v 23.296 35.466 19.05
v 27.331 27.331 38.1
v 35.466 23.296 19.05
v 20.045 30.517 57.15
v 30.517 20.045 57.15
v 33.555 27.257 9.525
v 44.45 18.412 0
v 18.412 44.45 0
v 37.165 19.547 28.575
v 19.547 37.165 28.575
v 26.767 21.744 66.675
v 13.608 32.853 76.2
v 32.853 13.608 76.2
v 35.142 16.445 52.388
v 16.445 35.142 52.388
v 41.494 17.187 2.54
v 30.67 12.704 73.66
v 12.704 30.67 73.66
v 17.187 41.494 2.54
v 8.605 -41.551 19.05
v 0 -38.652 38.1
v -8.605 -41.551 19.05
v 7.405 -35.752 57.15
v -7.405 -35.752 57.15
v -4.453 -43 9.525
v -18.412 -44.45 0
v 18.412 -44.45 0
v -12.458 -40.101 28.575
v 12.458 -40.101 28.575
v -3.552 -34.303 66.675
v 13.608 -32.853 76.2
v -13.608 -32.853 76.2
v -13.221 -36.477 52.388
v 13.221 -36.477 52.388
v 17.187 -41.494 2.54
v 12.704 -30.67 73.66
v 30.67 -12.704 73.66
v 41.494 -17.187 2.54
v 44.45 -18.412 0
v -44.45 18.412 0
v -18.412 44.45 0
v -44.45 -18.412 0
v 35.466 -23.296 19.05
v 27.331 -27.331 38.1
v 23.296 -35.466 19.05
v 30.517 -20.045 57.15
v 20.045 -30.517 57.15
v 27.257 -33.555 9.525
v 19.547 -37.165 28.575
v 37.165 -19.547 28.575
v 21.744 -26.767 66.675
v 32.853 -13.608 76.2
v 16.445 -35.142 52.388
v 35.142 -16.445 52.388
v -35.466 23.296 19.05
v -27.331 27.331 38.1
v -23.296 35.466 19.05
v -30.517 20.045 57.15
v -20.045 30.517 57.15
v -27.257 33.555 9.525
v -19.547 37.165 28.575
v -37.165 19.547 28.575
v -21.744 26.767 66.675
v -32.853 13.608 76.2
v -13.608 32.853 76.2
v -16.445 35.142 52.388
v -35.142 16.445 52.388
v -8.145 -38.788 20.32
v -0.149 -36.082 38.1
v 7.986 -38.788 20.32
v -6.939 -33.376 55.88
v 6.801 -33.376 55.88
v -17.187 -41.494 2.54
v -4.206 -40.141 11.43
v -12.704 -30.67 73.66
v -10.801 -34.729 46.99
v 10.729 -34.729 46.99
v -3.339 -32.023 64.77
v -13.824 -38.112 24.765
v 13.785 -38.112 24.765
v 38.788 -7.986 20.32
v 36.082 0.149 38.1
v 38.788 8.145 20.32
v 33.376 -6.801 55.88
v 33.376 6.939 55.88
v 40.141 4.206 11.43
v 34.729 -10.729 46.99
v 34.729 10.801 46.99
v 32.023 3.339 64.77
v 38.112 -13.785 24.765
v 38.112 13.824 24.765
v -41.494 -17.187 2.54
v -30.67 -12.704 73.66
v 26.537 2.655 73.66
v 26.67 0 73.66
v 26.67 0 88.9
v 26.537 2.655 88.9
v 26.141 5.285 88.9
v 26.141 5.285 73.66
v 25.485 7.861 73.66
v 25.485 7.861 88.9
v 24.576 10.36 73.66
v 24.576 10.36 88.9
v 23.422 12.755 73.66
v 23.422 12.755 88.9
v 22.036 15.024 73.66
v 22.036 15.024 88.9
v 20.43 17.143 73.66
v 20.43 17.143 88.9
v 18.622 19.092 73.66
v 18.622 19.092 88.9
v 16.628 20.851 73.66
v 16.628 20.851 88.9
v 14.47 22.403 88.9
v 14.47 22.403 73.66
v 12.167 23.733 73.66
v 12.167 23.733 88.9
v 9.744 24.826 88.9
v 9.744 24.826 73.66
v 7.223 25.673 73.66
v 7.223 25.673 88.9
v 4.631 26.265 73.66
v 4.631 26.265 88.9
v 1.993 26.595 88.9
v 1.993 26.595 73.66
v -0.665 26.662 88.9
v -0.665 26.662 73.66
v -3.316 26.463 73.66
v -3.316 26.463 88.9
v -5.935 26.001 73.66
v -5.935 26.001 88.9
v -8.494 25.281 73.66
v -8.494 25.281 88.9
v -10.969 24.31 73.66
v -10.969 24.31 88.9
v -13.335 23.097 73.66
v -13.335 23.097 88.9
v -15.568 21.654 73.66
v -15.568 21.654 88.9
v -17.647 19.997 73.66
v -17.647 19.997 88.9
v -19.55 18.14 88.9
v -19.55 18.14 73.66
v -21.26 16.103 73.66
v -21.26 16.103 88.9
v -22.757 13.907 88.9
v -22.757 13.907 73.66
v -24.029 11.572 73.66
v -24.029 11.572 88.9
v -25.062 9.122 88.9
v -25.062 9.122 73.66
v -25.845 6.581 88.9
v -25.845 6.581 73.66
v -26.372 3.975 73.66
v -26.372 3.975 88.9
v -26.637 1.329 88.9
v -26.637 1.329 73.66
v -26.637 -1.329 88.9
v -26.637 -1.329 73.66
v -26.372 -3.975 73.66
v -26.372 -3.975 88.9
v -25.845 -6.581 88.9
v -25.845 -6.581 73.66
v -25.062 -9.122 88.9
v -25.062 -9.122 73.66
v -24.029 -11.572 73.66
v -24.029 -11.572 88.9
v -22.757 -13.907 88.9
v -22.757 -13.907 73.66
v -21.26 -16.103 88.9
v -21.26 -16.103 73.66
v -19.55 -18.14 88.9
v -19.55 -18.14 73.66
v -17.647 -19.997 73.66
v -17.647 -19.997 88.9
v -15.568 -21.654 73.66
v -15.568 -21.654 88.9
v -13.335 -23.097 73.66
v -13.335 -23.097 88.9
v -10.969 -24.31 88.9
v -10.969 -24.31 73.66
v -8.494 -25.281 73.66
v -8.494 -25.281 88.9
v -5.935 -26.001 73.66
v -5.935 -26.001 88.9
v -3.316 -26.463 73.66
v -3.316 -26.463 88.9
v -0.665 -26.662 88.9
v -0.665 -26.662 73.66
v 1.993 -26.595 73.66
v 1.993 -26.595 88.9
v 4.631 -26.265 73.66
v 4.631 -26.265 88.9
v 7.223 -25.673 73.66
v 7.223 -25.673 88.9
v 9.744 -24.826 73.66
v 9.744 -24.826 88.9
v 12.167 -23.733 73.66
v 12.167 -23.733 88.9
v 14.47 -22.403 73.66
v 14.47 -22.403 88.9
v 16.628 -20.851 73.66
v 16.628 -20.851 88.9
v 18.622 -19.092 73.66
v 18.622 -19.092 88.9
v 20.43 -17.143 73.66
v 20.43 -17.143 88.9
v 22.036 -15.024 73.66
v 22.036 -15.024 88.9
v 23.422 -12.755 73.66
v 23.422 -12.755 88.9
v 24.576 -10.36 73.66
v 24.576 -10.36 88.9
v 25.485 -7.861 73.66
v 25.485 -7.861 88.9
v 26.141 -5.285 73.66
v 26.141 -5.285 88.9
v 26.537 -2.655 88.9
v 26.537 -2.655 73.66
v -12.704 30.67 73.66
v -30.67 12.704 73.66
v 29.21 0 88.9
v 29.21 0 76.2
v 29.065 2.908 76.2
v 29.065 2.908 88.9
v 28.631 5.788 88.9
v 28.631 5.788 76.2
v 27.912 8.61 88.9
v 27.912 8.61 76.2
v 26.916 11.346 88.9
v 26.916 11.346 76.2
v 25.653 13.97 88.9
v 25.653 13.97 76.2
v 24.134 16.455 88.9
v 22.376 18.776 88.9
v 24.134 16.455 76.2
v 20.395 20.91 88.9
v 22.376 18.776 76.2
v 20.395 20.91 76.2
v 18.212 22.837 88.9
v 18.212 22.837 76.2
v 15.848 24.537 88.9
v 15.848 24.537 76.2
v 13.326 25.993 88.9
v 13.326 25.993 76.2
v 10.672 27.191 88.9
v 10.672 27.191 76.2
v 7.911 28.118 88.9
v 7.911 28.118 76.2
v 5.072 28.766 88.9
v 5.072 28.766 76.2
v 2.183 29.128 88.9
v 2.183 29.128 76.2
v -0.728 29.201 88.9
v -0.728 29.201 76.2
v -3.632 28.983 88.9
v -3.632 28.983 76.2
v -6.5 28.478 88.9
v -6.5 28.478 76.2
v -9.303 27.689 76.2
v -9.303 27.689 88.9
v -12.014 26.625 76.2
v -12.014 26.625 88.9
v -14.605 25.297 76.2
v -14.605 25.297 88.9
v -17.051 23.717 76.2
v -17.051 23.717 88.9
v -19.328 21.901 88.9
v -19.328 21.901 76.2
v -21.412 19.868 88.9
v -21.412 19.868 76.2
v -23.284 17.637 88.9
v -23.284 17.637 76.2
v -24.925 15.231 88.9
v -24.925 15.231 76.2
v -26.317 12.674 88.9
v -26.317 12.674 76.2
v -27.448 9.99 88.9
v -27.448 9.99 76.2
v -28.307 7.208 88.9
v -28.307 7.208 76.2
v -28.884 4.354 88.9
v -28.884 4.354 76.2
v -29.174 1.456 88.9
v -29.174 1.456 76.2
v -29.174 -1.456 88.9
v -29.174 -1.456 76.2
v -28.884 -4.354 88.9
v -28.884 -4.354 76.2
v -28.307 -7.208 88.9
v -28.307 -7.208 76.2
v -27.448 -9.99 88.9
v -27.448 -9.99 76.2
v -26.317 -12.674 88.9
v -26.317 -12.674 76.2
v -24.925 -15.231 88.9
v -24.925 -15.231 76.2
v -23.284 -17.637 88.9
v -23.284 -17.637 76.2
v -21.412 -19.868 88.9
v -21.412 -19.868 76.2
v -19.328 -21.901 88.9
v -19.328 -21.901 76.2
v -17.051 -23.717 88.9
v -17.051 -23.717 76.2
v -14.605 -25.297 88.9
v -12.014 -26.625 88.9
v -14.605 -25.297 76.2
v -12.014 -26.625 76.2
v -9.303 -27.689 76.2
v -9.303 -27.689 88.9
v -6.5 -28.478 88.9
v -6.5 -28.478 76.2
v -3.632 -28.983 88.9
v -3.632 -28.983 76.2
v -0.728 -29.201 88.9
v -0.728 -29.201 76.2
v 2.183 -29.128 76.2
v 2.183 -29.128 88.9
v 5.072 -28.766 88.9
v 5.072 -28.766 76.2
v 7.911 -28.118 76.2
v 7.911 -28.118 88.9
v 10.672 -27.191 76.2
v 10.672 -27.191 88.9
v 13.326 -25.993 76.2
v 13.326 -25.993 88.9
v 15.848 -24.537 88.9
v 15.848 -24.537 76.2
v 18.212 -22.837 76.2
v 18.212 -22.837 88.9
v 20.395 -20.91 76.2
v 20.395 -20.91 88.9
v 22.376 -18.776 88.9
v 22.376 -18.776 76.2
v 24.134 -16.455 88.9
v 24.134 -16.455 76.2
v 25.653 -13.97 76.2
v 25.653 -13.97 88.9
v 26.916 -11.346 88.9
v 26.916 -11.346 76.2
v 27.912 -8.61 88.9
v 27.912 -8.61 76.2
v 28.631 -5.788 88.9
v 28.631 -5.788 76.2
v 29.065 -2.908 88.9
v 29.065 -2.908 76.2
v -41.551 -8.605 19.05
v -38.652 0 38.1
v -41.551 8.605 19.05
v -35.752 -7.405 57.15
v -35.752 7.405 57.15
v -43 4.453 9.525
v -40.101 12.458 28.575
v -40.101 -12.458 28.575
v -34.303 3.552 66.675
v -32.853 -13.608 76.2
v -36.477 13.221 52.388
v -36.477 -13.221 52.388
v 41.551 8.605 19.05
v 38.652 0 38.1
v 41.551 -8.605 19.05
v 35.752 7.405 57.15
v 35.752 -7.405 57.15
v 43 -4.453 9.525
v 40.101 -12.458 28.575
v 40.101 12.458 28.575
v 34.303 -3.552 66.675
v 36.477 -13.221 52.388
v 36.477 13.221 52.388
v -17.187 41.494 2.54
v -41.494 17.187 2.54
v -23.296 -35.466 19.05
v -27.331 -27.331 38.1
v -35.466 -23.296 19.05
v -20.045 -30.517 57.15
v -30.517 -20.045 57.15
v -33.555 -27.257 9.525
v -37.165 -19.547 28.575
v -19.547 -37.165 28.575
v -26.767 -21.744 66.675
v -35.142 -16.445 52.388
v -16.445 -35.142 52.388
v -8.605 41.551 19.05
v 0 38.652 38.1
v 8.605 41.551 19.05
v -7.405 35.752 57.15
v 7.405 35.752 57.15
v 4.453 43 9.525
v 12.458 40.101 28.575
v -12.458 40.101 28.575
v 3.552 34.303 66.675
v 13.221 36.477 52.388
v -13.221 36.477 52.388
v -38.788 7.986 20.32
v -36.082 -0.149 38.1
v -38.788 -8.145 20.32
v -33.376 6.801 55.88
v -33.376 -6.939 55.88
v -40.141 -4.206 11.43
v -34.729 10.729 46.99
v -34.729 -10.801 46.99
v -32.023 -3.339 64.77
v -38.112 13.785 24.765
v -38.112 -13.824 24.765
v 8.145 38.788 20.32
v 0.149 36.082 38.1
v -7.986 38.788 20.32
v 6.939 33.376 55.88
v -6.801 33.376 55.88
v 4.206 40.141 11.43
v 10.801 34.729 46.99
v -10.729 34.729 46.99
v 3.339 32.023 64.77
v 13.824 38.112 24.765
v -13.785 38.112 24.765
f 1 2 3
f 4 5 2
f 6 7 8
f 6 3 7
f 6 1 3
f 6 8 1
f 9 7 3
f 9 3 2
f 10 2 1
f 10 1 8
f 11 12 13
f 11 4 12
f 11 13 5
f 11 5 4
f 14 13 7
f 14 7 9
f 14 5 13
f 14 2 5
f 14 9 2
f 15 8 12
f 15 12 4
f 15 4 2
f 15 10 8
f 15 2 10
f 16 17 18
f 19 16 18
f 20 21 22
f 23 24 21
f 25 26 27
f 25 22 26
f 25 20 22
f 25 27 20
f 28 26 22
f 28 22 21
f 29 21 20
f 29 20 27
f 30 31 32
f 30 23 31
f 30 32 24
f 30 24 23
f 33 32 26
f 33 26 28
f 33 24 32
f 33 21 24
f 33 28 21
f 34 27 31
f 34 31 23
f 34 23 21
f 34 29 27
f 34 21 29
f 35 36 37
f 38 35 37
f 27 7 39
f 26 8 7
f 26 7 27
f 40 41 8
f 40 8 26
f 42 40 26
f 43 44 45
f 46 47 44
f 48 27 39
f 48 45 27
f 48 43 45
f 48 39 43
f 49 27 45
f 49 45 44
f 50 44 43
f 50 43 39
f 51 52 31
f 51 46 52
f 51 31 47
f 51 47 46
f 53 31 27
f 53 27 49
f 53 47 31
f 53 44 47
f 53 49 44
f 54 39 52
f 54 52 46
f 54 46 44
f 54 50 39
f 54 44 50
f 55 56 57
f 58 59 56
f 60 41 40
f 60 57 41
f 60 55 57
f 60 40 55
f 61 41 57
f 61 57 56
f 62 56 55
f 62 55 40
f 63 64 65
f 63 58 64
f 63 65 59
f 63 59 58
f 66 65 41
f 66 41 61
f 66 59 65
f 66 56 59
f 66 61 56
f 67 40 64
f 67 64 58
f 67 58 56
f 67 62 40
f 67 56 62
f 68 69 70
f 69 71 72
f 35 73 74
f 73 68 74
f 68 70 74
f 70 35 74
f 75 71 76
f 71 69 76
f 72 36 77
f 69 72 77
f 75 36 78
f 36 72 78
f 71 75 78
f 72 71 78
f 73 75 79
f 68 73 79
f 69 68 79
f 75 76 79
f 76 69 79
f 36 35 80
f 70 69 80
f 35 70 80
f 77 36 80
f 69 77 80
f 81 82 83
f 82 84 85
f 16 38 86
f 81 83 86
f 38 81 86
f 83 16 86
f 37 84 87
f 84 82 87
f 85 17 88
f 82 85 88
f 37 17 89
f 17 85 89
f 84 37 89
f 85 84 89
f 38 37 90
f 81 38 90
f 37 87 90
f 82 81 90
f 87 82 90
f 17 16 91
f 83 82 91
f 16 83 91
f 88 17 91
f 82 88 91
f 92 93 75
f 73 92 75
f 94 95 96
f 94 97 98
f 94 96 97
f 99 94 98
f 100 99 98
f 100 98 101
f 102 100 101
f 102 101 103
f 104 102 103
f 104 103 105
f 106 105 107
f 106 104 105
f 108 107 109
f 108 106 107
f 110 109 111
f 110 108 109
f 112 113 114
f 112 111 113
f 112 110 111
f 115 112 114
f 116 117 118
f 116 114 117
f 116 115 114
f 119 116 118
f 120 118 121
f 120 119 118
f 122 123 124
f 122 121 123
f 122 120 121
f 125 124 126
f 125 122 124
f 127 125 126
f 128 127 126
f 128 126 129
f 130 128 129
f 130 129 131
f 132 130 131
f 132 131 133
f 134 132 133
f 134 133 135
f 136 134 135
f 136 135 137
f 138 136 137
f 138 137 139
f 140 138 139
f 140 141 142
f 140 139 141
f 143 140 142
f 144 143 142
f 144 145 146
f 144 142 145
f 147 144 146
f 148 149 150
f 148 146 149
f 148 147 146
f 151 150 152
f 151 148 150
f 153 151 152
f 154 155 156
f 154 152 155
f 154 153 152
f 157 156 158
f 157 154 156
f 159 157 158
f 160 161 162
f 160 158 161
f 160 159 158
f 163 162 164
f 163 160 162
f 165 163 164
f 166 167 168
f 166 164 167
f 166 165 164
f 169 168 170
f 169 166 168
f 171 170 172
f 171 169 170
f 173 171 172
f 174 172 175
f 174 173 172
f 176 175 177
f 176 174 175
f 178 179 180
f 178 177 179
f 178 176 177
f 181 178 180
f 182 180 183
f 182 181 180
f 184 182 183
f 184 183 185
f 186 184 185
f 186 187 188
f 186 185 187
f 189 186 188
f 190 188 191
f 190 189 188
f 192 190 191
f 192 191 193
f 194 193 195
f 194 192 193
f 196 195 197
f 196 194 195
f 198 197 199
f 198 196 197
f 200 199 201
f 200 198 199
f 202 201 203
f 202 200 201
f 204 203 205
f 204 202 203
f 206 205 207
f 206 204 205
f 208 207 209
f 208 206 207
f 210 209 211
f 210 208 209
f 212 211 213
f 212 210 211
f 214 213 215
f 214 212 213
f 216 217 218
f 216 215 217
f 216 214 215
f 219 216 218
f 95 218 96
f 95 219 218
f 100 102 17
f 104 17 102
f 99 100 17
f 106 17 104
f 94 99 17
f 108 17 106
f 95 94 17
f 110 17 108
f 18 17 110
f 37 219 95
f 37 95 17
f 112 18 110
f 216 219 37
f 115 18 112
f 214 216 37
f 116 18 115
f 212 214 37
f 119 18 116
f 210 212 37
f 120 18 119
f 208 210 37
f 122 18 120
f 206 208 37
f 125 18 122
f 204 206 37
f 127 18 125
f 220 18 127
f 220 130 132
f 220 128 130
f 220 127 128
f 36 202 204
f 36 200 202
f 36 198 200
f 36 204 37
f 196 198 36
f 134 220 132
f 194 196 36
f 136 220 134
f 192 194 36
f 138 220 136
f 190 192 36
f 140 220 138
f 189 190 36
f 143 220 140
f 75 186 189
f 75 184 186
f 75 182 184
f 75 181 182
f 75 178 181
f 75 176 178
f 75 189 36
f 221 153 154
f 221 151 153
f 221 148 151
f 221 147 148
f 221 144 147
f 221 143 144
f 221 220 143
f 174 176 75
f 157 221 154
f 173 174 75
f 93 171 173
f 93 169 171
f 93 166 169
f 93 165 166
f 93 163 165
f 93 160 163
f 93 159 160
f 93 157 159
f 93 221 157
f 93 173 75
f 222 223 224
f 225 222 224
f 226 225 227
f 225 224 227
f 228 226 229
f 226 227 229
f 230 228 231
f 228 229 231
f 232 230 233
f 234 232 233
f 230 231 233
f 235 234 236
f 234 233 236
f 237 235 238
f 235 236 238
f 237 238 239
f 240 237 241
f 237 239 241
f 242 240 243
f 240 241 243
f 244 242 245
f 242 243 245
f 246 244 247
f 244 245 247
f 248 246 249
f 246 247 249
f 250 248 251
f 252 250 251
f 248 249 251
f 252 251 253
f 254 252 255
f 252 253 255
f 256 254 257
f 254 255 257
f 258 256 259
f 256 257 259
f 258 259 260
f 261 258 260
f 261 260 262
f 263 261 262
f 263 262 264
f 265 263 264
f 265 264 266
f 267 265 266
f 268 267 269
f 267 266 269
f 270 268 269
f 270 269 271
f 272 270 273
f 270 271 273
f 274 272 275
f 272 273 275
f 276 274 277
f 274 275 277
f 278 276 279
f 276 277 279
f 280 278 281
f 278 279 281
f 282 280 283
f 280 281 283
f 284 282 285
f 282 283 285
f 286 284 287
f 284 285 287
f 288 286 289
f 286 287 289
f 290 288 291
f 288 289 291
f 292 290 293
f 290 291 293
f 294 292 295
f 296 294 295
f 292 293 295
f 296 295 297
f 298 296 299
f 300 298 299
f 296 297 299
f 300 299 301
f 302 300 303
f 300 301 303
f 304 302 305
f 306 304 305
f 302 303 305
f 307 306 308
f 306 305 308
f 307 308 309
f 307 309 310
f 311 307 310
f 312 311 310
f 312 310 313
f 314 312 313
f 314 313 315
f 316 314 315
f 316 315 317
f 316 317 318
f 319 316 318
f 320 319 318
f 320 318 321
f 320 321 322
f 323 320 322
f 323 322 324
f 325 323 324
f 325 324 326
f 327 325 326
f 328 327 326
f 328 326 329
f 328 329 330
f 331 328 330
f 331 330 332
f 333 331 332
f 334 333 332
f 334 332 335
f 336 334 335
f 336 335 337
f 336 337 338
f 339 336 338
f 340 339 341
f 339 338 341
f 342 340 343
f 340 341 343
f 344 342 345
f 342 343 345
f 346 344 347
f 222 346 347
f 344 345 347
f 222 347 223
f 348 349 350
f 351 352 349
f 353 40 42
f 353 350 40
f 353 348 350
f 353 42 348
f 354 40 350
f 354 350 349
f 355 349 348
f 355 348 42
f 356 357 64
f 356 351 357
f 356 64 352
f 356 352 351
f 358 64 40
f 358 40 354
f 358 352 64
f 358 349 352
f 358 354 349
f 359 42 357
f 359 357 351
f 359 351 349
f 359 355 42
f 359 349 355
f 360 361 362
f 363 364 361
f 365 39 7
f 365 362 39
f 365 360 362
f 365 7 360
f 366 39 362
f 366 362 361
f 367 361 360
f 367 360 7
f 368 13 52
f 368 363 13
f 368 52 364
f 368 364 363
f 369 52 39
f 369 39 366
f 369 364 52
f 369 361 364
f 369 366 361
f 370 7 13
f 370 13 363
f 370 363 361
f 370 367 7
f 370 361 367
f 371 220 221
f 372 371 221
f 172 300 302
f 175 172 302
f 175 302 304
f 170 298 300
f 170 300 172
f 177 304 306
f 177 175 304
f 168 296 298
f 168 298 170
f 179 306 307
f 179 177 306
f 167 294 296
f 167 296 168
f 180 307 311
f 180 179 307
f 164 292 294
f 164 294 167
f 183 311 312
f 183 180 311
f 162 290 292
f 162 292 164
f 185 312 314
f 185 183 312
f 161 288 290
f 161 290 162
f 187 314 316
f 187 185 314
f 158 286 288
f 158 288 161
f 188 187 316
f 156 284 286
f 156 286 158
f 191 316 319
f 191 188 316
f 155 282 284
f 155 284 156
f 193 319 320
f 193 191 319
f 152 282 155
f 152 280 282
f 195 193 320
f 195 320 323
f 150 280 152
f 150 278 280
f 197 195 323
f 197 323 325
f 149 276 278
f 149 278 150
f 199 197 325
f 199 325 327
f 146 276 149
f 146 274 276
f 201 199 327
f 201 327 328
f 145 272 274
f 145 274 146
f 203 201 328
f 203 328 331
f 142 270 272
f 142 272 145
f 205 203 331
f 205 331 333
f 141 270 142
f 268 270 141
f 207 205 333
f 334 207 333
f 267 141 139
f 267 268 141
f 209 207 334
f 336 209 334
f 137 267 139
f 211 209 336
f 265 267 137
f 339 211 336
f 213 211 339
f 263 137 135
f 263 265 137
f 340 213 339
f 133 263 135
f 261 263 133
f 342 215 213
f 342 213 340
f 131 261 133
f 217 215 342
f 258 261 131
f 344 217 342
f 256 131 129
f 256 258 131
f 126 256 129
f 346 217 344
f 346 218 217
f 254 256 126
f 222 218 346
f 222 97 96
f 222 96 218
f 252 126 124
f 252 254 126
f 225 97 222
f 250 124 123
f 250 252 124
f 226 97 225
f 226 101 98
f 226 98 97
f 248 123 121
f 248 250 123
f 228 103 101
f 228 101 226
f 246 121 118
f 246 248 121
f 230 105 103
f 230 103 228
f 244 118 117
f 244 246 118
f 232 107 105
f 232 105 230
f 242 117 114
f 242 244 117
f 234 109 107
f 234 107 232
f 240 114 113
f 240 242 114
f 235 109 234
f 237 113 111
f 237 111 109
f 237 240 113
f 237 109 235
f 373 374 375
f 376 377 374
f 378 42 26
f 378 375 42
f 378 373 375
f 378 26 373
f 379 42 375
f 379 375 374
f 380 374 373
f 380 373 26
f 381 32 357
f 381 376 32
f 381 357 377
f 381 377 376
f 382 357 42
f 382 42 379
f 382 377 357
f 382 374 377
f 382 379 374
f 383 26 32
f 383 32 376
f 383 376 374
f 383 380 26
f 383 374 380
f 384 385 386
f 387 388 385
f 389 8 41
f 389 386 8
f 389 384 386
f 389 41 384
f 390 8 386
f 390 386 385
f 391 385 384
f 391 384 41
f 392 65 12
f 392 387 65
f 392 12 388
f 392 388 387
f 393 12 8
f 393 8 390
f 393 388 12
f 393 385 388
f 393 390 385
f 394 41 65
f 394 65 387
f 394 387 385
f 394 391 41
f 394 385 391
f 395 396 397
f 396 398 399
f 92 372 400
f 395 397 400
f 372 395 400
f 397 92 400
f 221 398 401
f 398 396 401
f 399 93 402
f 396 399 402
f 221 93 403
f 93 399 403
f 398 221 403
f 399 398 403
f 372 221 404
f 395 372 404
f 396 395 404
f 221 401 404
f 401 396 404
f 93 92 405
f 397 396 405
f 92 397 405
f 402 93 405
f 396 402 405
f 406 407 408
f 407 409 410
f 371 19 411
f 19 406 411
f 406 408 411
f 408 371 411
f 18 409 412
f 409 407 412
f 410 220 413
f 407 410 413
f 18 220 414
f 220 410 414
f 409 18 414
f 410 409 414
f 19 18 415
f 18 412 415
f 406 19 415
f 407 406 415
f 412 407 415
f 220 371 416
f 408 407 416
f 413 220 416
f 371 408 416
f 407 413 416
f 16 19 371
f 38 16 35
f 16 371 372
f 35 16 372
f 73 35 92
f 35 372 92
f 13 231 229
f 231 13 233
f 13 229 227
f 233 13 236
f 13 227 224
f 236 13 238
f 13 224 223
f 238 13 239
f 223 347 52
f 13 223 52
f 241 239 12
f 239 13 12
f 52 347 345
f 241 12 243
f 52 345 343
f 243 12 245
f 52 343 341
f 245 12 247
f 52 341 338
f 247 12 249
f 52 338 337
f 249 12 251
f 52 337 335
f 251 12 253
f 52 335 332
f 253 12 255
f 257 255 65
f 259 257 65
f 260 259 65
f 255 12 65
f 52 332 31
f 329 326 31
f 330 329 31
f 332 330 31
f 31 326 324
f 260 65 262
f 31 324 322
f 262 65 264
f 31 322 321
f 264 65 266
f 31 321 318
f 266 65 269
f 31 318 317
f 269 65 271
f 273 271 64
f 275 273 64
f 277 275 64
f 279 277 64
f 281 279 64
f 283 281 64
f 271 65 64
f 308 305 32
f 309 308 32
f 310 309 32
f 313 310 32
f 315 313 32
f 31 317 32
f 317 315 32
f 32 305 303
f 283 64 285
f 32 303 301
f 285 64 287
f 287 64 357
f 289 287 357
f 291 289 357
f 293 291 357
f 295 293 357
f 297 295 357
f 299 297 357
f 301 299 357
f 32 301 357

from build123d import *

# Parameters (mm, degrees)
F4_R     = 29.21
F5_DEPTH = 12.7
F6_T     = -2.54


with BuildPart() as f3:
    # F0 (on Top) → F3 section 0
    with BuildSketch(Plane.XY):
        Polygon((18.4117928475, 44.45), (-18.4117928475, 44.45), (-44.45, 18.4117928475), (-44.45, -18.4117928475), (-18.4117928475, -44.45), (18.4117928475, -44.45), (44.45, -18.4117928475), (44.45, 18.4117928475), align=None)
    # F2 (on offset) → F3 section 1
    with BuildSketch(Plane.XY.offset(76.2)):
        Polygon((32.8531561761, -13.6082228549), (32.8531561761, 13.6082228549), (13.6082228549, 32.8531561761), (-13.6082228549, 32.8531561761), (-32.8531561761, 13.6082228549), (-32.8531561761, -13.6082228549), (-13.6082228549, -32.8531561761), (13.6082228549, -32.8531561761), align=None)
    loft()

    # F4 (on face) → F5 (join)
    with BuildSketch(Plane.XY.offset(76.2)):
        Circle(F4_R)
    extrude(amount=F5_DEPTH)

    # F6
    f6_openings = [f3.faces().sort_by_distance(p)[0] for p in [
        (0, 0, 88.9),
    ]]
    offset(amount=F6_T, openings=f6_openings, kind=Kind.INTERSECTION)


solid = f3.part
